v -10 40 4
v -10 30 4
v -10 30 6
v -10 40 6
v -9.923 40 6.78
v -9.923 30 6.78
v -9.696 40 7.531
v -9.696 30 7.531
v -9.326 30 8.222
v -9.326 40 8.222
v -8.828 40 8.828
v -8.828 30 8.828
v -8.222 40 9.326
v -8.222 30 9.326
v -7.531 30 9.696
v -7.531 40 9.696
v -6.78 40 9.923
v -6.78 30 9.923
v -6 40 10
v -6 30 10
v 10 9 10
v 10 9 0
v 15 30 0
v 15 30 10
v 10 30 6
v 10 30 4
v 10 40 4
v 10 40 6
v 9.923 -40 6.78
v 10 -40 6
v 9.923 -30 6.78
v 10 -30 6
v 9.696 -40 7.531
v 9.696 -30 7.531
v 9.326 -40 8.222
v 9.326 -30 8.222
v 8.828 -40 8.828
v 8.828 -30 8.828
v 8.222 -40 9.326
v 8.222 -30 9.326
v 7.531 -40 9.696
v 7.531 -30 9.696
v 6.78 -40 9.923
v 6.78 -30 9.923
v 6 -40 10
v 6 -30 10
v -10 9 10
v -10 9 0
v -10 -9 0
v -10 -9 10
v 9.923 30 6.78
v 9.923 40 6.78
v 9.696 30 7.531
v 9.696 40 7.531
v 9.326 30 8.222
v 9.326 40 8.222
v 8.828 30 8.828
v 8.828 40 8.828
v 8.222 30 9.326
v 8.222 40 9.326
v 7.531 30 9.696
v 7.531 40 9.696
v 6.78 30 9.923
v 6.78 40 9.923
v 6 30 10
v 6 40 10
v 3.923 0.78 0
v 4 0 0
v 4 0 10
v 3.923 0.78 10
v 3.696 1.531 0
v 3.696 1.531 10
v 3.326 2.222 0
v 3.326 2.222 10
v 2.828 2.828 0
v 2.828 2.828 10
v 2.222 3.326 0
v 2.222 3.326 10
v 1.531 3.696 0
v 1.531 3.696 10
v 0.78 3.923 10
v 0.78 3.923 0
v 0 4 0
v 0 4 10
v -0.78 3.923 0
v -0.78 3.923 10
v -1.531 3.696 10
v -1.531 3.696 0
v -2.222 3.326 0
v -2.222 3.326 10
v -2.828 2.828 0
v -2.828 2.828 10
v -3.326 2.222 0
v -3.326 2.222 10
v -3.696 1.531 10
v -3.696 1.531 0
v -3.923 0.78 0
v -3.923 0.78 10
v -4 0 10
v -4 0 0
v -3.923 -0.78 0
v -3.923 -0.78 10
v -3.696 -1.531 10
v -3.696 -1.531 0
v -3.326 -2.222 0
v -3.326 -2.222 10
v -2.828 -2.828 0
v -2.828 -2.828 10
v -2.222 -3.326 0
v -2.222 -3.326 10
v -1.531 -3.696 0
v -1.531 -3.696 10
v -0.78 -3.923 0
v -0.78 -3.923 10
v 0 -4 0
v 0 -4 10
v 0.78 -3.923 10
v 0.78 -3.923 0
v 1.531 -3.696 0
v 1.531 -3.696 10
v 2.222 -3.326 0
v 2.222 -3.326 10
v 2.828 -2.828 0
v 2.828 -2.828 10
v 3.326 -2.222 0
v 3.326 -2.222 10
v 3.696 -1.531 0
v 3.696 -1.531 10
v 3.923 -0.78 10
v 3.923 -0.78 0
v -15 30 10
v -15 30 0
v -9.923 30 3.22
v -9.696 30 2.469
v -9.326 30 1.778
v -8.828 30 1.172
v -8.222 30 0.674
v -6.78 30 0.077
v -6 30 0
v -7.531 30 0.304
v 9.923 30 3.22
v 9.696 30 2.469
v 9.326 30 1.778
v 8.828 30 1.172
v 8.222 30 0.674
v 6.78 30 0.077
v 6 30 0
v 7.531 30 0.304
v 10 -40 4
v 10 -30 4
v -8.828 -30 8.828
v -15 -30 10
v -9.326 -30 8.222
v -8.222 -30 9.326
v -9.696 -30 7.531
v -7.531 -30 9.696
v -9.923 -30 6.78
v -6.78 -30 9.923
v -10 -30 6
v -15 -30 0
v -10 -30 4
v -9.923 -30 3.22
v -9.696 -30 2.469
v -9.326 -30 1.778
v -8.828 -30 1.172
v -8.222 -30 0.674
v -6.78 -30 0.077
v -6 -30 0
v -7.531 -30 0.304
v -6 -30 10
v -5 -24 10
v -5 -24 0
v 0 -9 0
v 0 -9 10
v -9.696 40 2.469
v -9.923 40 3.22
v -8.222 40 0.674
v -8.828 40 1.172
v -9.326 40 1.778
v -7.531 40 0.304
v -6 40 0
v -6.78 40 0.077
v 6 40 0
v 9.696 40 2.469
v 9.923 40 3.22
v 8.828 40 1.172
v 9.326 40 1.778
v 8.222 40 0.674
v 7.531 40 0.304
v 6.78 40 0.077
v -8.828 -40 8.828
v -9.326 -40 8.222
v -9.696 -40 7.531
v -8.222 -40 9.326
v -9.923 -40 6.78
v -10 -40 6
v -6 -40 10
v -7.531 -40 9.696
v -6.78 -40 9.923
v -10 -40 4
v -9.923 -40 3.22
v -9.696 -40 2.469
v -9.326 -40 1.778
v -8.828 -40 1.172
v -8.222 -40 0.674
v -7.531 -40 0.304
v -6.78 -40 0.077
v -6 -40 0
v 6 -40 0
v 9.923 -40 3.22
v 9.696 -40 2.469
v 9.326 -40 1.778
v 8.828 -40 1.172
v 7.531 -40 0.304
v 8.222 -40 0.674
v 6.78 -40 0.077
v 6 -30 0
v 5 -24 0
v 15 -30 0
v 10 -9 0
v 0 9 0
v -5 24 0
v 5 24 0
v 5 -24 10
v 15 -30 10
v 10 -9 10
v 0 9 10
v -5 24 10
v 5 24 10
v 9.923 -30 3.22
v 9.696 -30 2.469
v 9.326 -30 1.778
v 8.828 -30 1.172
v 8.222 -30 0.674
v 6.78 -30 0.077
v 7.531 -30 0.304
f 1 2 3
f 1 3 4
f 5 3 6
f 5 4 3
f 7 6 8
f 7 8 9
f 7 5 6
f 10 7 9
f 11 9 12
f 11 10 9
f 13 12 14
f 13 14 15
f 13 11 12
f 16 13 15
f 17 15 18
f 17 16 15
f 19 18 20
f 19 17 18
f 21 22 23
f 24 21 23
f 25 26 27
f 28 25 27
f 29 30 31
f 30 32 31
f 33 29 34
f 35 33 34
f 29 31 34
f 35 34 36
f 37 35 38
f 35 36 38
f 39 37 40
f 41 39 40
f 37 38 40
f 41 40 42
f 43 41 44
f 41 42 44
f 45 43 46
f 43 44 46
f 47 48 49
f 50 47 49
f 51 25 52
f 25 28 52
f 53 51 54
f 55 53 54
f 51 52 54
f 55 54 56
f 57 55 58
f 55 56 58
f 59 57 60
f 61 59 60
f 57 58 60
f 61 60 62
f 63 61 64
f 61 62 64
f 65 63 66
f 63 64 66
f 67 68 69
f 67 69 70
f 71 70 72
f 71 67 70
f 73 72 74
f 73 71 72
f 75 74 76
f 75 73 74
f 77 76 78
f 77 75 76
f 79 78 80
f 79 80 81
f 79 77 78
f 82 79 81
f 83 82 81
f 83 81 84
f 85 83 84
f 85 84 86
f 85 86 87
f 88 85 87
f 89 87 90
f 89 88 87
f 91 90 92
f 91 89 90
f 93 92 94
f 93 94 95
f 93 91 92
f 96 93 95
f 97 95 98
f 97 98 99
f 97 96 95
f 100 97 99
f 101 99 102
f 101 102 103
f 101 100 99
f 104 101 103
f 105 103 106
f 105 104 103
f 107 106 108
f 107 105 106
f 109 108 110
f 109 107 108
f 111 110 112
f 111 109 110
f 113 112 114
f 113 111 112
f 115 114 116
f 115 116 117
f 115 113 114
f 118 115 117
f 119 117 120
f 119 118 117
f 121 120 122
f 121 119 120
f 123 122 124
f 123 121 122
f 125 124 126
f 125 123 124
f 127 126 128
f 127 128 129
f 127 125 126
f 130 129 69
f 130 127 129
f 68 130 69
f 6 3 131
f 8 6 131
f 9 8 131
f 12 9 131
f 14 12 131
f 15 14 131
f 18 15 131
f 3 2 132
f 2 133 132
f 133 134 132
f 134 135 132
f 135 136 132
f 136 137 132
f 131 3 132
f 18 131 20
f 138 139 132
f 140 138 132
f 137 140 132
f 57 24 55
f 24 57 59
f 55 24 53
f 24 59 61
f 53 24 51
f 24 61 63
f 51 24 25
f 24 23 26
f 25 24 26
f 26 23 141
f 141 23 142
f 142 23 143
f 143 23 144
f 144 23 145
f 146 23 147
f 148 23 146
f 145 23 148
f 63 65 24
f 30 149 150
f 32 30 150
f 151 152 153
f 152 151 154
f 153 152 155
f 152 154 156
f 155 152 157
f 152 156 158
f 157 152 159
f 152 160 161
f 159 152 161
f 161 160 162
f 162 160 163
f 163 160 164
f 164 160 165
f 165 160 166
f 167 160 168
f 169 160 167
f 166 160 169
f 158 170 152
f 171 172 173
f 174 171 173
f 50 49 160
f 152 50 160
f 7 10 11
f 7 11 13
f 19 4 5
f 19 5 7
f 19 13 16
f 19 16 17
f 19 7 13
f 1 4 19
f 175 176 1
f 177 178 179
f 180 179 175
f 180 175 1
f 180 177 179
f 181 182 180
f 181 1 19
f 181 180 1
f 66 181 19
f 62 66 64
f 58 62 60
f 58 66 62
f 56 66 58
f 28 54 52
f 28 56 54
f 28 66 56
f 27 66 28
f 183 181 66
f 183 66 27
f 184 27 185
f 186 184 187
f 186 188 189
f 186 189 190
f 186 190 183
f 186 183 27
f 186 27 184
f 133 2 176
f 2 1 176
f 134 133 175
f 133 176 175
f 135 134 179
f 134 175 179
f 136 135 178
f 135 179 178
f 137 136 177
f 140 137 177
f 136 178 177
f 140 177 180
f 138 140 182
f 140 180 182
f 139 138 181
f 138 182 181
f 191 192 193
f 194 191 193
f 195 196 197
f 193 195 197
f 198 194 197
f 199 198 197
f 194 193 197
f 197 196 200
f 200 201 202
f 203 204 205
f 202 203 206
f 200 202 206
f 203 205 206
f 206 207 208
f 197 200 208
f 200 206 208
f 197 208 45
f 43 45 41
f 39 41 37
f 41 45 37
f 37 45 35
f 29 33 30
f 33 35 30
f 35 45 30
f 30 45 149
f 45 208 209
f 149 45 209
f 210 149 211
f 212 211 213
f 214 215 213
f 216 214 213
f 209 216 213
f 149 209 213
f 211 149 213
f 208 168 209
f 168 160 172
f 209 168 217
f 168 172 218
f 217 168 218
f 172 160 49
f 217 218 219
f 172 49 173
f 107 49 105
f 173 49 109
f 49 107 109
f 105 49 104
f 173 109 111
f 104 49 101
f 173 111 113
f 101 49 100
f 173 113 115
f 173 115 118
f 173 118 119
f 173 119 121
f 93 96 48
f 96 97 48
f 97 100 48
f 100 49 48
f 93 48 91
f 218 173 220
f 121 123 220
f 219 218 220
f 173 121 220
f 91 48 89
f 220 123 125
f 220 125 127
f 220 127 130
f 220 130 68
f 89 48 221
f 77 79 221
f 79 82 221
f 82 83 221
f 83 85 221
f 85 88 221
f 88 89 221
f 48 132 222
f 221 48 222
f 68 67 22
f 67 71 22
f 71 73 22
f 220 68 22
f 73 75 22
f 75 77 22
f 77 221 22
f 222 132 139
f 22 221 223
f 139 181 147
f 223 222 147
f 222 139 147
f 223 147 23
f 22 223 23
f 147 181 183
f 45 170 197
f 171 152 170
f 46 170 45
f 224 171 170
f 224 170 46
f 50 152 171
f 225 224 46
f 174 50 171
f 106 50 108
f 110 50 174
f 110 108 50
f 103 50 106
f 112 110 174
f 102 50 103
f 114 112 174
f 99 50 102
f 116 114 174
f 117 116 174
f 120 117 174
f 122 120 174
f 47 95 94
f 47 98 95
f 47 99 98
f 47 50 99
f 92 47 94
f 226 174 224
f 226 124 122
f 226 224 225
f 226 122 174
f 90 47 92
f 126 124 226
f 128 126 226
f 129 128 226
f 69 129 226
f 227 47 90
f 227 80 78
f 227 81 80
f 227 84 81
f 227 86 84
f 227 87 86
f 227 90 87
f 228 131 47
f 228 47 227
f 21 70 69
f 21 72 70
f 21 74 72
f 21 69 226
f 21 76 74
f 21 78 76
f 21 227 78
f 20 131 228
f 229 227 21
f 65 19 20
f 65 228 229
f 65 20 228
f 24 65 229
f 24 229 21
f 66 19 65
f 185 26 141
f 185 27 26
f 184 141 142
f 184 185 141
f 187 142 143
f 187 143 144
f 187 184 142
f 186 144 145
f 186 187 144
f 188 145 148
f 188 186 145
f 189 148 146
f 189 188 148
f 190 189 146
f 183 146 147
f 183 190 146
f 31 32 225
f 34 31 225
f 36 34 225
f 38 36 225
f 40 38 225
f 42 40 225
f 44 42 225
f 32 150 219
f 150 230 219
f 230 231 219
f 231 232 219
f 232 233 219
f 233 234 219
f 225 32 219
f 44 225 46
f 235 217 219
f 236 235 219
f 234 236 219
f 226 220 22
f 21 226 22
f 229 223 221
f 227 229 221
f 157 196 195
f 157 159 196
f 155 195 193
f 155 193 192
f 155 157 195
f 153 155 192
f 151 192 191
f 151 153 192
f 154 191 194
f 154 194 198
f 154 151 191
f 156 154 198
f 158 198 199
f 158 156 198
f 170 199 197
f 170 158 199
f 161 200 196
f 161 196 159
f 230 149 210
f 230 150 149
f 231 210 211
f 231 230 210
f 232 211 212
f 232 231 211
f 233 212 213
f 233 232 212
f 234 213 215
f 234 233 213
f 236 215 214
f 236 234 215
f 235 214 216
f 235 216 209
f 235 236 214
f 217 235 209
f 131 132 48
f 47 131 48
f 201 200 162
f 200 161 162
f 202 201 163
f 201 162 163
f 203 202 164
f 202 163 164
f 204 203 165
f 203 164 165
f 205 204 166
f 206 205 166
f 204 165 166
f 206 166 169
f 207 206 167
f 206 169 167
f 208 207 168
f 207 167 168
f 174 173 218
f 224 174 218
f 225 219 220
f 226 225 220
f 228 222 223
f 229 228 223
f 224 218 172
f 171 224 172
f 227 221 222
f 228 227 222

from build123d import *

# Parameters (mm, degrees)
F0_R     = 4
F0_W     = 20
F0_H     = 10
F1_DEPTH = 10
F2_R     = 4


with BuildPart() as f1:
    # F0 (on Top) → F1 (new body)
    with BuildSketch(Plane.XY):
        Polygon((10, 9), (15, 30), (10, 30), (-10, 30), (-15, 30), (-10, 9), (-10, 0), (-10, -9), (-15, -30), (-10, -30), (10, -30), (15, -30), (10, -9), (10, 0), align=None)
        Polygon((-5, -24), (0, -9), (5, -24), align=None, mode=Mode.SUBTRACT)
        Circle(F0_R, mode=Mode.SUBTRACT)
        Polygon((5, 24), (0, 9), (-5, 24), align=None, mode=Mode.SUBTRACT)
        with Locations((0, 35)):
            Rectangle(F0_W, F0_H)
        with Locations((0, -35)):
            Rectangle(F0_W, F0_H)
    extrude(amount=F1_DEPTH)

    # F2
    f2_edges = [f1.edges().sort_by_distance(p)[0] for p in [
        (-10, -35, 10),
        (10, -35, 10),
        (-10, -35, 0),
        (10, -35, 0),
        (10, 35, 0),
        (-10, 35, 0),
        (-10, 35, 10),
        (10, 35, 10),
    ]]
    fillet(f2_edges, radius=F2_R)


solid = f1.part
